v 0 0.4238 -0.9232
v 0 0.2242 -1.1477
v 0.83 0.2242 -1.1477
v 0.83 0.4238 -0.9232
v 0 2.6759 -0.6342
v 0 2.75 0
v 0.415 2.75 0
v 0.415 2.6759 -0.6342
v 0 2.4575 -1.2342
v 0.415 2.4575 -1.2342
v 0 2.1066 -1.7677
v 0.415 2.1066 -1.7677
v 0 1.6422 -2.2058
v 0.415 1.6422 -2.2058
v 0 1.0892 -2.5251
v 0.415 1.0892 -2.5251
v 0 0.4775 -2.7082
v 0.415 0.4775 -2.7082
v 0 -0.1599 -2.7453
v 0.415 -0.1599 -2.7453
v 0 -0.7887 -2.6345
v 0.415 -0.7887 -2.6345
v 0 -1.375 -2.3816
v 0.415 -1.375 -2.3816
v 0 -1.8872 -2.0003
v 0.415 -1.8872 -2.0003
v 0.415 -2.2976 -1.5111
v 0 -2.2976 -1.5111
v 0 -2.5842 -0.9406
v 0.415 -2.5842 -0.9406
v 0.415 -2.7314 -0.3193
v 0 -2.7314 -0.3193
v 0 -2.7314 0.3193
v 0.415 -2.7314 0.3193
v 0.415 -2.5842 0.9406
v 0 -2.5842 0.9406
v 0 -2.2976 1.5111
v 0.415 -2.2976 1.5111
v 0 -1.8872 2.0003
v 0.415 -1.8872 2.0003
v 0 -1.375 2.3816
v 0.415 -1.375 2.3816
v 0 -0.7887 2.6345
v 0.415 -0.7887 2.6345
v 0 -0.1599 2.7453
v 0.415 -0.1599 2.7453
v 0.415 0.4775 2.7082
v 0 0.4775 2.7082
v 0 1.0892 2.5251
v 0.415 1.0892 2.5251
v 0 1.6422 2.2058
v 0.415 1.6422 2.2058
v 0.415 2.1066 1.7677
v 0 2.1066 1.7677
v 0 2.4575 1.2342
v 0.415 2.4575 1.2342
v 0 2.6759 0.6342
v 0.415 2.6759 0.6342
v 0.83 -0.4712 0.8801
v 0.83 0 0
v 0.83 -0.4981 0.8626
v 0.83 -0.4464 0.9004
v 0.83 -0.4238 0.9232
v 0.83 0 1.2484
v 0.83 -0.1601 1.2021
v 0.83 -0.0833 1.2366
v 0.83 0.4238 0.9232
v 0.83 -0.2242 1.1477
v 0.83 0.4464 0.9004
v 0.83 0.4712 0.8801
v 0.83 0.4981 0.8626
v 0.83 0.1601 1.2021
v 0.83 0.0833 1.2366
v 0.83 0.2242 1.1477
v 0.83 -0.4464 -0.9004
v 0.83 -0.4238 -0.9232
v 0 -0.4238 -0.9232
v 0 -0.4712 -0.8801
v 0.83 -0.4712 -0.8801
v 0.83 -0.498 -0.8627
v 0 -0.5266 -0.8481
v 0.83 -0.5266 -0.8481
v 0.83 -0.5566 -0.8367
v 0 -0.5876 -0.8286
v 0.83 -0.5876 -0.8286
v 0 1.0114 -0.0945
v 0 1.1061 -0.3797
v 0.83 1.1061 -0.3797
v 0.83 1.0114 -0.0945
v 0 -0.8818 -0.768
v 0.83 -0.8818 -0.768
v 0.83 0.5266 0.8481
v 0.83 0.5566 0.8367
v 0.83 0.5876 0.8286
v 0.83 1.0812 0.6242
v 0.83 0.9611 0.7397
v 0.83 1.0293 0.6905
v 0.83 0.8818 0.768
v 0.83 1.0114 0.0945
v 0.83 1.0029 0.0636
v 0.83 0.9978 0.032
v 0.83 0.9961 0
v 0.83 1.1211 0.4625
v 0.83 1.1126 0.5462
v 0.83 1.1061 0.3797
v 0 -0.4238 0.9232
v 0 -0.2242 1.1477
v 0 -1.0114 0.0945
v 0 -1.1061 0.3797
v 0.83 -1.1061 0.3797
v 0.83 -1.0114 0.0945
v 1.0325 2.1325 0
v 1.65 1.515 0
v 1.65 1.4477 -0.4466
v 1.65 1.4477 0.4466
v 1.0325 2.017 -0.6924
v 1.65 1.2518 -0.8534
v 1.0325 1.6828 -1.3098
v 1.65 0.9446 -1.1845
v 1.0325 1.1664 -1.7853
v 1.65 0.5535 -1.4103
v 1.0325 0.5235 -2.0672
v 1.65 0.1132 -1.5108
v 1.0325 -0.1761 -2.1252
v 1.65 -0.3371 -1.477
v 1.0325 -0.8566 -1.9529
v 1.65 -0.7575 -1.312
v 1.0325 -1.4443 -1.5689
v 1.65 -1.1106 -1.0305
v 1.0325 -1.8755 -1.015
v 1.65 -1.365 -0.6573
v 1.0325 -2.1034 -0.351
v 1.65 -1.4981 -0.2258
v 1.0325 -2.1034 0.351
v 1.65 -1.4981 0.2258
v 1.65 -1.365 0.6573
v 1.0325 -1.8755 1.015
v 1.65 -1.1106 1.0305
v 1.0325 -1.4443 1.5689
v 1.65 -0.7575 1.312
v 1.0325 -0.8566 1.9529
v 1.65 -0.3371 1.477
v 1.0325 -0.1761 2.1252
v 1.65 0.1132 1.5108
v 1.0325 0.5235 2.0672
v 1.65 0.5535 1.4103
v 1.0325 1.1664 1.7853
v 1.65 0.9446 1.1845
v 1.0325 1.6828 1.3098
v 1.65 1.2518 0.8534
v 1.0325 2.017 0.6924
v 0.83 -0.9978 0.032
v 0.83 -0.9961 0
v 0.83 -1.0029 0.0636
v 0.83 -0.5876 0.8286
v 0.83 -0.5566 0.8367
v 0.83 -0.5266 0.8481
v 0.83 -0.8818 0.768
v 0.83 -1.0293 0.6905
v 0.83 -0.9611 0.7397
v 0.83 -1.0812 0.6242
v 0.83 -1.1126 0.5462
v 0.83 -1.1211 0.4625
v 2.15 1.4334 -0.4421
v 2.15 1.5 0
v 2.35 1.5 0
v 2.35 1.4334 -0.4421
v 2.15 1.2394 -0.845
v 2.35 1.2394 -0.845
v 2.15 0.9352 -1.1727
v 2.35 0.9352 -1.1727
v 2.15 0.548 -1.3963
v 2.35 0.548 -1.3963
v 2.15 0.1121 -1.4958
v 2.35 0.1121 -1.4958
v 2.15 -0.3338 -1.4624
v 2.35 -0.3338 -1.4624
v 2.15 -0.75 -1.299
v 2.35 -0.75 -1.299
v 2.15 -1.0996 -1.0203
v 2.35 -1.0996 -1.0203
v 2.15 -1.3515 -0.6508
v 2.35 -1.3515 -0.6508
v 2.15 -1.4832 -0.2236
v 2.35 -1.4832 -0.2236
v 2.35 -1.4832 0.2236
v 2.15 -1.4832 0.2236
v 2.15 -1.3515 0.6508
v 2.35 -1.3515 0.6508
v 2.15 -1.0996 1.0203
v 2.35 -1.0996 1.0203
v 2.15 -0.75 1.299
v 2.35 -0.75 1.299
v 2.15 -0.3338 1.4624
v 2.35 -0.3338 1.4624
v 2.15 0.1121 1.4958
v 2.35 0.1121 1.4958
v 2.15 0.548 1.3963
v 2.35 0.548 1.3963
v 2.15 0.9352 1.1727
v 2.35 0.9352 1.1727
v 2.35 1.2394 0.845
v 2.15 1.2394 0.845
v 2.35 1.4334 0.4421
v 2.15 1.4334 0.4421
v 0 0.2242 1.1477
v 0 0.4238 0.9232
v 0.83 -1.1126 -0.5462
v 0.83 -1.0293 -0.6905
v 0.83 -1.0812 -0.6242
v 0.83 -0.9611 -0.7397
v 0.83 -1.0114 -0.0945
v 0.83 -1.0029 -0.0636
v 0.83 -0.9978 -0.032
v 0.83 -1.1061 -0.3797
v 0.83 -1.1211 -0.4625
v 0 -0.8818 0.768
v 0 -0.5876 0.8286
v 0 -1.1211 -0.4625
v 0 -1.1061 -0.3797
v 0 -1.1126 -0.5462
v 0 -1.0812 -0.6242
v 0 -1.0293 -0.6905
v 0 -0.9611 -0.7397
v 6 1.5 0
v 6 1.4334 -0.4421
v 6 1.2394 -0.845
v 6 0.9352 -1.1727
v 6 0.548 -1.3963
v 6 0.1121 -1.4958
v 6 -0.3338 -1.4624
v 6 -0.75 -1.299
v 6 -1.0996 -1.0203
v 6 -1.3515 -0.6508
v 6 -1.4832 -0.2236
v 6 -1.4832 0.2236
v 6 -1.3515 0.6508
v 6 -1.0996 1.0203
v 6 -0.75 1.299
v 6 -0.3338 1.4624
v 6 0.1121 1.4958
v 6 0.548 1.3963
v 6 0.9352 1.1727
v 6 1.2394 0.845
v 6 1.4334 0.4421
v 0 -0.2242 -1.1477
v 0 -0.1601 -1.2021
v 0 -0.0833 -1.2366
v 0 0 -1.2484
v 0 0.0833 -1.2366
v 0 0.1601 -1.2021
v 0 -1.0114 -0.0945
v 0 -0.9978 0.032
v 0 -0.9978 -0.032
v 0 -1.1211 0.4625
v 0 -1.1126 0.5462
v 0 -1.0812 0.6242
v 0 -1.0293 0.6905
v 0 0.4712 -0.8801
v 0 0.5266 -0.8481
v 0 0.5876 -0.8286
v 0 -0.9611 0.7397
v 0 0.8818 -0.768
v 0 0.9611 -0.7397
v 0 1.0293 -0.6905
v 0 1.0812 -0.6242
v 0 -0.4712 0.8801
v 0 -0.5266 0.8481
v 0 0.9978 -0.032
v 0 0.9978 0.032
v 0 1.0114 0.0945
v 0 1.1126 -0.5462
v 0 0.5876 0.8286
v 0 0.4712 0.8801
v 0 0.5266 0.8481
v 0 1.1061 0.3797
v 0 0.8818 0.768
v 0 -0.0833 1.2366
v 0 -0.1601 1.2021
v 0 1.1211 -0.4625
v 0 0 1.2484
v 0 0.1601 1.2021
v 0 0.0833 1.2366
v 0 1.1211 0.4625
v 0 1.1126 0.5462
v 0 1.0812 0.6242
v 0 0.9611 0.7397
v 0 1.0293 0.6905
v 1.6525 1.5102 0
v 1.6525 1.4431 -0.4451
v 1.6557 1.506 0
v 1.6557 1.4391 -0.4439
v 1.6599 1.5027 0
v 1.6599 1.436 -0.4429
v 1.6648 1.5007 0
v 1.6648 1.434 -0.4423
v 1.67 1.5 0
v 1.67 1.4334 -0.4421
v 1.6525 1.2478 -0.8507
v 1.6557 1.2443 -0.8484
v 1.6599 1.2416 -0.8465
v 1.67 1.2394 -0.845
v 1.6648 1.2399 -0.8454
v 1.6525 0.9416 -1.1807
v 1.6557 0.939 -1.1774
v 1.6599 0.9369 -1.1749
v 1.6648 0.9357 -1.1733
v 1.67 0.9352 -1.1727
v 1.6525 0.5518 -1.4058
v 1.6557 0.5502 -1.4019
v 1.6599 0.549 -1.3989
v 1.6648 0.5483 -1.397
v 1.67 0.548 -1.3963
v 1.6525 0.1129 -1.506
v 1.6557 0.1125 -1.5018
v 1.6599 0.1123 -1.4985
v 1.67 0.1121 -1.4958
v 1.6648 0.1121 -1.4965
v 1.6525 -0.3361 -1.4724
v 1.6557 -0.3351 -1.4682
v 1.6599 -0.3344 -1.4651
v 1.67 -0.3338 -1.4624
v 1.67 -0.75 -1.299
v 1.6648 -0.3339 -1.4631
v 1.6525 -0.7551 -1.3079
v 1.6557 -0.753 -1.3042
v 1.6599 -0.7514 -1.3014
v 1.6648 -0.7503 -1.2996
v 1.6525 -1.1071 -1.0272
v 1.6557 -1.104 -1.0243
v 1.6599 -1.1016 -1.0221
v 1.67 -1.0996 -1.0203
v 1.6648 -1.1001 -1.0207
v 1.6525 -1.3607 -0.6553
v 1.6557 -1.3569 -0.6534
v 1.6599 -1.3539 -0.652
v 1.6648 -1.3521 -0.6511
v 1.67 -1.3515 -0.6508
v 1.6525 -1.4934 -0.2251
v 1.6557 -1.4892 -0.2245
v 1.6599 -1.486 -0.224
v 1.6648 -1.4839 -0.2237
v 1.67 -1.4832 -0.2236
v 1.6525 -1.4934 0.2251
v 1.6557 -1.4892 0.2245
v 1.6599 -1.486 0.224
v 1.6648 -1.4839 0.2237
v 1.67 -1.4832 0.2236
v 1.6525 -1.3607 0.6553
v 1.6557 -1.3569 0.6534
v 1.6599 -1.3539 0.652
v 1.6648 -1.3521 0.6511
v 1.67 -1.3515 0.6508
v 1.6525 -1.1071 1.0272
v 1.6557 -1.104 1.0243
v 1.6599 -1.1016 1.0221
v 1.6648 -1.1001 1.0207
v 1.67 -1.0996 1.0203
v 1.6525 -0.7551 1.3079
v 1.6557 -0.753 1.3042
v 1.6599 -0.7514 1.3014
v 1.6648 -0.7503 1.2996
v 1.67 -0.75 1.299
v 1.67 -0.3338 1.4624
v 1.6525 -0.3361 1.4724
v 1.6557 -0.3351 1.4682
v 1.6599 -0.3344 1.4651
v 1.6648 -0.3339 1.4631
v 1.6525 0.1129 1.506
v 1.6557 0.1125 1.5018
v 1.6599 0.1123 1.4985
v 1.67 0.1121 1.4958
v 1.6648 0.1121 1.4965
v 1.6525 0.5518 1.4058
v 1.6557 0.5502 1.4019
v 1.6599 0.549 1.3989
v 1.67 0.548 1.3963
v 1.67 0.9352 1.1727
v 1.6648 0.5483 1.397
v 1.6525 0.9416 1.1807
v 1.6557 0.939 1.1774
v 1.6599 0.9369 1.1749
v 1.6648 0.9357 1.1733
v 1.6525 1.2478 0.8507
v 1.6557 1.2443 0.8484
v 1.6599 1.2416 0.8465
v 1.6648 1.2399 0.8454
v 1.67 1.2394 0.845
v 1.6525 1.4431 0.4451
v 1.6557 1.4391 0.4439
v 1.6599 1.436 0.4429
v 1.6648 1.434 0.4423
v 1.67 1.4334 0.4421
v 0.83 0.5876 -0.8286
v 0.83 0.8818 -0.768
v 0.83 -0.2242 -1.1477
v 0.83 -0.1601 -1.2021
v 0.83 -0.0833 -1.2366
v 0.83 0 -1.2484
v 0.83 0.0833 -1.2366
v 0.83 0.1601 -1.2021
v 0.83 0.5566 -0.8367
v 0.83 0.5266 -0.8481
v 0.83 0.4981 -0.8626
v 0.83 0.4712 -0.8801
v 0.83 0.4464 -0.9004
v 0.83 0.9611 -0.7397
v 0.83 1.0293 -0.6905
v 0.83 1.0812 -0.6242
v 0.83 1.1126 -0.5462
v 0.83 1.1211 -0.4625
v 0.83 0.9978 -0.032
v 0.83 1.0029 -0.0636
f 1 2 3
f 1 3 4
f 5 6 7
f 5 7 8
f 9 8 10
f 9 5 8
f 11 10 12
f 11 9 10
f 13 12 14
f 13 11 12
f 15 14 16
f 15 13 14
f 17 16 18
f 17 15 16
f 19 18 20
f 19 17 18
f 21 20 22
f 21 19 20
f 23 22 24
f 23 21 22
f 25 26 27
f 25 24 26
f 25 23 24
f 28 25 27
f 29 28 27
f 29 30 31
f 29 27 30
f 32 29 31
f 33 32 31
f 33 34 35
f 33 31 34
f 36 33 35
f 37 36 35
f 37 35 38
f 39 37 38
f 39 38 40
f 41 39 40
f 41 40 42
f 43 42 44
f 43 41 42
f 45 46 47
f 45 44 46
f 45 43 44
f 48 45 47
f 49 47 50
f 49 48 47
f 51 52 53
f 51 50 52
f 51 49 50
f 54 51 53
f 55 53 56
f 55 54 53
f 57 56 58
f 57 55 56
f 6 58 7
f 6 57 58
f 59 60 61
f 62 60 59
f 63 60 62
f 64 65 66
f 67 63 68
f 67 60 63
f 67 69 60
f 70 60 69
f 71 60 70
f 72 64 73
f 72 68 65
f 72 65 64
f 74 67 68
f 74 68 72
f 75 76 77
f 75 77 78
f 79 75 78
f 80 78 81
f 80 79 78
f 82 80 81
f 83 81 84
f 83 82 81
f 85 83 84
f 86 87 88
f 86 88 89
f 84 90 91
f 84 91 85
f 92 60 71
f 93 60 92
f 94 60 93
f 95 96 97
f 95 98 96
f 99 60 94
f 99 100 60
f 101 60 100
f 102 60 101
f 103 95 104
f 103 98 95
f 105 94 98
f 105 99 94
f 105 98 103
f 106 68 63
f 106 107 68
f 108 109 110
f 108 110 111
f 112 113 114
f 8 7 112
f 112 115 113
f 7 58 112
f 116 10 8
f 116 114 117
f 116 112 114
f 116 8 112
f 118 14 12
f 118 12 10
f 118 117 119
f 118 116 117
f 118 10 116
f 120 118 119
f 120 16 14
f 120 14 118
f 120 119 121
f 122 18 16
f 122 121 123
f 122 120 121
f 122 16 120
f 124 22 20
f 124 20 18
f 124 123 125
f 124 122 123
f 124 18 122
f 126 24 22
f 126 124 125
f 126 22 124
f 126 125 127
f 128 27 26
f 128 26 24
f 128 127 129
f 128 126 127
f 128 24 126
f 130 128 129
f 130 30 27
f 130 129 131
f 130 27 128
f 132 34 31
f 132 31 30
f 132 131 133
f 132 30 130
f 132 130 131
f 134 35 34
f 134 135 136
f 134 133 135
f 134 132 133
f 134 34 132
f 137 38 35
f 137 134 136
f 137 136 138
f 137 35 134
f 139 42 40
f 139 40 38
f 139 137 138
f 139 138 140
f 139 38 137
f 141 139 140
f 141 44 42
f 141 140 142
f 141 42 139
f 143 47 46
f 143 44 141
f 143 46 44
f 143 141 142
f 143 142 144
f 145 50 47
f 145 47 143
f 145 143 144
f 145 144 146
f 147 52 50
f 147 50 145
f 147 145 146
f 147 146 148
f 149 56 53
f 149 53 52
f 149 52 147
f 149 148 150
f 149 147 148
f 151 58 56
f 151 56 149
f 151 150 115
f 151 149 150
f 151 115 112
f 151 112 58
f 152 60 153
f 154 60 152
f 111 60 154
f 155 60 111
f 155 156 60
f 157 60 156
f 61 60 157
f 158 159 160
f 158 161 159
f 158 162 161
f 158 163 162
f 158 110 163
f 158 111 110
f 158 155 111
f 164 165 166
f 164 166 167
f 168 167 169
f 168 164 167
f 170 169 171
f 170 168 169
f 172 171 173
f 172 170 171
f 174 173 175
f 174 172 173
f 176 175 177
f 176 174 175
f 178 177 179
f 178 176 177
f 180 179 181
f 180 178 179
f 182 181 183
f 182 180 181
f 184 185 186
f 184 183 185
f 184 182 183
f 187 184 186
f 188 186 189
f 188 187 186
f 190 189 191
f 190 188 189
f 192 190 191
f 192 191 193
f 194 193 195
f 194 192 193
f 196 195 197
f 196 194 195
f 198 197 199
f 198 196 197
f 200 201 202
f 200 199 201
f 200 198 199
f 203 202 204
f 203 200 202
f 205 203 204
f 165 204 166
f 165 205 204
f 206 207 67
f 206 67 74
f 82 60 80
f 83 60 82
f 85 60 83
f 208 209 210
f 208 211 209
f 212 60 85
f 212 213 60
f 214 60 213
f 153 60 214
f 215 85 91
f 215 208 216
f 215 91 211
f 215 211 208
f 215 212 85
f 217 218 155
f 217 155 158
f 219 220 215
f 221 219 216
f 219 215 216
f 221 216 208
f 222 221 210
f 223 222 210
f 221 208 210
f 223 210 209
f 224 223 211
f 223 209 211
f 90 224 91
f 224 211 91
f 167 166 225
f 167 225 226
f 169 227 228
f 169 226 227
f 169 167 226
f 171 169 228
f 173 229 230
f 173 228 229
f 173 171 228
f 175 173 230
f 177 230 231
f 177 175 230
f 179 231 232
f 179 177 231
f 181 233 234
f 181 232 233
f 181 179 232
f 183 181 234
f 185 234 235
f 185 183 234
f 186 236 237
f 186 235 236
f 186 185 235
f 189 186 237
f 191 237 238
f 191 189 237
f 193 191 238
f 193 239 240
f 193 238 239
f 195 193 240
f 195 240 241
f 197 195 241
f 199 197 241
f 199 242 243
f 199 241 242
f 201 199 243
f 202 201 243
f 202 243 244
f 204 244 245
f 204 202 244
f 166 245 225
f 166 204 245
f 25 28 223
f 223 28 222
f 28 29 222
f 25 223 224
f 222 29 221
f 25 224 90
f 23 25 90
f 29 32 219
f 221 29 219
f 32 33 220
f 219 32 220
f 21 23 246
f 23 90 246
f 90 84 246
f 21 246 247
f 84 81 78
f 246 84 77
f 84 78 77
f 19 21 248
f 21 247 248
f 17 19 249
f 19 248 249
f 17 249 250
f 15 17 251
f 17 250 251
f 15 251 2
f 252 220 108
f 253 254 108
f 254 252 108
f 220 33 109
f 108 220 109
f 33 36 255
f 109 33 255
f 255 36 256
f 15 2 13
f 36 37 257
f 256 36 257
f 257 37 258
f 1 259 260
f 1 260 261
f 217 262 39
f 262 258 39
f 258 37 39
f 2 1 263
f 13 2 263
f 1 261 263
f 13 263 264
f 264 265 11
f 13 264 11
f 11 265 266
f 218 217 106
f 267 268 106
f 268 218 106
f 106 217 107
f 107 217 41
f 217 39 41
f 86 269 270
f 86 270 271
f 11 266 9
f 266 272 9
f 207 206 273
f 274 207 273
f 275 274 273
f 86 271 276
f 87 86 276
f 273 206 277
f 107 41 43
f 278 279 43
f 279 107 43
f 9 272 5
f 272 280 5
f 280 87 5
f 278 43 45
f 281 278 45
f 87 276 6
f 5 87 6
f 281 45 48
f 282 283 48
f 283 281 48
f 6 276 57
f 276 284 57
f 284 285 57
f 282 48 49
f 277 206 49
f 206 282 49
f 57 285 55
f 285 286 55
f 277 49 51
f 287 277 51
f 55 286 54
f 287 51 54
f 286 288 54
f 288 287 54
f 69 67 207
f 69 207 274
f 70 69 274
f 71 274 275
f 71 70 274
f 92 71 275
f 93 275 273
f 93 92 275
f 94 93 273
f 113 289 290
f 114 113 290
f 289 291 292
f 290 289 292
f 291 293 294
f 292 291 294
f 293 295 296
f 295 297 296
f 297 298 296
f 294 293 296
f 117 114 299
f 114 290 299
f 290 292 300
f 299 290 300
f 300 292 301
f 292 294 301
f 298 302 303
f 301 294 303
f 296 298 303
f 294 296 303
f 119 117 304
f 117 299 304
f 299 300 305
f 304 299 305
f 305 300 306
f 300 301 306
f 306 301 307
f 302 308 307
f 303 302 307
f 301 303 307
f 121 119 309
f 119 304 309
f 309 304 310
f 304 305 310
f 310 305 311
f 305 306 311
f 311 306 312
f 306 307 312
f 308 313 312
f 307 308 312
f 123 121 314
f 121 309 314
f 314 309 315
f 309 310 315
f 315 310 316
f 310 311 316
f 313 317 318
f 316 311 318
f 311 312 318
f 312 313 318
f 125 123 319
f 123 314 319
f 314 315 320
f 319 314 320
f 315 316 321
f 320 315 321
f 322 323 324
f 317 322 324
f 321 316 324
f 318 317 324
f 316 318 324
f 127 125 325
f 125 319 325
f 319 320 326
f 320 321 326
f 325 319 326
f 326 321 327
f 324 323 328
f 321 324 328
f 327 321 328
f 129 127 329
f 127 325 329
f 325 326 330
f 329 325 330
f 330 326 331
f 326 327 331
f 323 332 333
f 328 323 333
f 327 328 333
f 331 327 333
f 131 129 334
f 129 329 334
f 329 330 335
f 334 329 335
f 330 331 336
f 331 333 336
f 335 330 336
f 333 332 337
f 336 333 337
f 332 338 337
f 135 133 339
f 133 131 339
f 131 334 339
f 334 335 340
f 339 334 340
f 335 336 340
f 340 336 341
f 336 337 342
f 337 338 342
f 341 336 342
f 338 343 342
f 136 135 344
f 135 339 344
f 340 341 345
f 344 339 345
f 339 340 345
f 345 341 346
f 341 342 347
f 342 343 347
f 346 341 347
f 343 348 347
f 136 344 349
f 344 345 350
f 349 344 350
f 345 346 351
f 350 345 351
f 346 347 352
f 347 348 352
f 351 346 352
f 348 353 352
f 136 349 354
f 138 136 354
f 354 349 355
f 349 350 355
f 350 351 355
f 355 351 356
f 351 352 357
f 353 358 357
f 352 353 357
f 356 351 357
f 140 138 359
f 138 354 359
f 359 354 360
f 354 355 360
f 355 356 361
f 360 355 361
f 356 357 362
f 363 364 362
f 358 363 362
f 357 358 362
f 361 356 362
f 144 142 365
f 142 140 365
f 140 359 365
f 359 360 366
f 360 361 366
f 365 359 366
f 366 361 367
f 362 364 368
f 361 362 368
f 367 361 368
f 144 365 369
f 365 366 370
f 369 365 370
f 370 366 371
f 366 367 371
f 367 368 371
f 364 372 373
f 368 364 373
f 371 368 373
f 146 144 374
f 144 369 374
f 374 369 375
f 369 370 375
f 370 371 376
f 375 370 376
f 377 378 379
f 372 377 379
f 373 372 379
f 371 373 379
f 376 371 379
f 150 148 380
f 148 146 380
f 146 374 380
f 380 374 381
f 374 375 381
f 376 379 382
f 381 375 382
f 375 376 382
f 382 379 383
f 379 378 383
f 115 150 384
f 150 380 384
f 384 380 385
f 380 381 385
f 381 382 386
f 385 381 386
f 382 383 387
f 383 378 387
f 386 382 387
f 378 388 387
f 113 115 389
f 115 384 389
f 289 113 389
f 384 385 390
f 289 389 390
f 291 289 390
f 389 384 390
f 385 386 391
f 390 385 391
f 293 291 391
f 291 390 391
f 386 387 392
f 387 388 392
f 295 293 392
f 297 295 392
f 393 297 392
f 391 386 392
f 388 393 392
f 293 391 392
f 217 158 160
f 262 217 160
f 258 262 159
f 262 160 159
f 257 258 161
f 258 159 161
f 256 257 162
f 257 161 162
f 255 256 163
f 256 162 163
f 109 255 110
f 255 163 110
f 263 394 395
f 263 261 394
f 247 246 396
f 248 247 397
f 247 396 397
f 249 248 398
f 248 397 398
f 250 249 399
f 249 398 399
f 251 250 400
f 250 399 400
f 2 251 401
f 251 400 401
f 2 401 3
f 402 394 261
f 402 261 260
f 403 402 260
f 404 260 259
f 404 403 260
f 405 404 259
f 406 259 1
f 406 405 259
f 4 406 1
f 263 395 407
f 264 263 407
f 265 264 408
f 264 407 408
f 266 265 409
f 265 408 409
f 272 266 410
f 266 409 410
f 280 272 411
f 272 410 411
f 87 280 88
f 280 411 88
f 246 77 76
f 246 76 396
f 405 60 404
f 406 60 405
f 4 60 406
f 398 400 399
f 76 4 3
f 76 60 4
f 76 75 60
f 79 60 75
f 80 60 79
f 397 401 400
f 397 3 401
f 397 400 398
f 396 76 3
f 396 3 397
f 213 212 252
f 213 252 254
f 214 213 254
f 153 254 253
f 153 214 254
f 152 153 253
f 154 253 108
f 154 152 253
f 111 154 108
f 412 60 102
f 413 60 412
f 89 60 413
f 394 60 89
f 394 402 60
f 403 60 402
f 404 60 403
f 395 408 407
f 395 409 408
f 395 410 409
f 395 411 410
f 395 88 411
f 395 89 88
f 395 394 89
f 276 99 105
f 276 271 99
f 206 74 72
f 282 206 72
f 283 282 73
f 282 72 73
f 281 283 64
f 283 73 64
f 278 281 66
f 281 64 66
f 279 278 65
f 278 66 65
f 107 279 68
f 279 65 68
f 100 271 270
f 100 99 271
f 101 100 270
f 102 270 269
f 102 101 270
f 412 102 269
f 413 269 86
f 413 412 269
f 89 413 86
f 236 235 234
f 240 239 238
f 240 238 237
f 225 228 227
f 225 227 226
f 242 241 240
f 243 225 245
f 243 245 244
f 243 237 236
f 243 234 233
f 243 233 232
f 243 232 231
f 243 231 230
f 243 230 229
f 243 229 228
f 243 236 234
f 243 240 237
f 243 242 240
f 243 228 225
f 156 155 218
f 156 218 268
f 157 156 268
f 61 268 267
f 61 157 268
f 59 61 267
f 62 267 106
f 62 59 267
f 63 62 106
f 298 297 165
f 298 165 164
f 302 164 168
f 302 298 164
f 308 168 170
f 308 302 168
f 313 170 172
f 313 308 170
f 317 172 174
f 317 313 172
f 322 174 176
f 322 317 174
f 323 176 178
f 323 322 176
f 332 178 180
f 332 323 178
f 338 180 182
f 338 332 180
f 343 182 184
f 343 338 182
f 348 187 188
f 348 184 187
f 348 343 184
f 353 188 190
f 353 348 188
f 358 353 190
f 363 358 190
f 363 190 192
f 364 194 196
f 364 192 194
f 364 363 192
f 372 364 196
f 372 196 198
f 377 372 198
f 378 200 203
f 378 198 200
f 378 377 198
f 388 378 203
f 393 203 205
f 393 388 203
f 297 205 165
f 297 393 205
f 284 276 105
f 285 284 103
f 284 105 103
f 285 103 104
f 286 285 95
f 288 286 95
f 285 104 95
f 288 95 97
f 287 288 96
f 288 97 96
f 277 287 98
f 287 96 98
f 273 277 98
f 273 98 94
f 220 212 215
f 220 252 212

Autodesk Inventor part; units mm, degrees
ref_plane "YZ Plane" through (0, 0, 0) normal (1, 0, 0) x (0, 1, 0)
ref_plane "XZ Plane" through (0, 0, 0) normal (0, 1, 0) x (-1, 0, 0)
ref_plane "XY Plane" through (0, 0, 0) normal (0, 0, 1) x (1, 0, 0)
sketch "Sketch1" plane through (0, 0, 0) normal (0, 0, 1) x (1, 0, 0)
  line L0 (0, 0) -> (6, 0)
  line L1 (6, 0) -> (6, 1.5)
  line L2 (6, 1.5) -> (2.35, 1.5)
  line L3 (2.35, 1.5) -> (2.15, 1.5)
  line L4 (2.15, 1.5) -> (1.67, 1.5)
  line L5 (1.65, 1.515) -> (1.65, 1.515)
  line L6 (1.65, 1.515) -> (0.415, 2.75)
  line L7 (0.415, 2.75) -> (0, 2.75)
  line L8 (0, 2.75) -> (0, 0)
  line L9 (1.65, 1.515) -> (1.65, 1.52)
  arc A0 (1.65, 1.52) -> (1.67, 1.5) centre (1.67, 1.52) ccw
  dimension "d17" = 6
  dimension "d18" = 0.415
  dimension "d19" = 1.65
  dimension "d20" = 0
  dimension "d21" = 5.5
  dimension "d22" = 3
  dimension "d23" = 3
  dimension "d25" = 45
  dimension "d26" = 0.2
  dimension "d28" = 0.02
  dimension "d29" = 3.65
  dimension "d30" = 0.02
  dimension "d52" = 0.7
revolve "Revolution1" add sketch "Sketch1" angle 360 about axis through (0, 0, 0) along (1, 0, 0)
thread "Thread1" size "M3x0.5" class "6g" standard "ISO Metric profile" length 3.65
sketch "Sketch2" plane through (0, 0, 0) normal (-1, 0, 0) x (0, 0, 1)
  circle A0 centre (0, 0) radius 1.4 construction
  circle A1 centre (0, 0) radius 0.98 construction
  line L0 (0, 0) -> (0.8487, 0.49)
  line L1 (0, 0) -> (0.98, 0) construction
  line L2 (0, 0) -> (0.8487, -0.49)
  line L3 (0, 0) -> (0.98, 0) construction
  line L4 (0.8487, 0.49) -> (1.4, 0)
  line L5 (1.4, 0) -> (0.8487, -0.49)
  dimension "d34" = 2.8
  dimension "d35" = 1.96
  dimension "d39" = 30
  dimension "d40" = 330
extrude "Extrusion1" cut sketch "Sketch2" against normal blind 0.83
pattern_circular "Circular Pattern1" count 6 over 360 about axis through (-10, 0, 0) along (1, 0, 0) of "Extrusion1"
fillet "Fillet1" radius 0.3 12 edges at (0.415, 0.49, 0.8487) (0.415, 0, 1.4) (0.415, -0.49, 0.8487) (0.415, -0.98, 0) (0.415, -1.2124, 0.7) (0.415, -1.2124, -0.7) (0.415, -0.49, -0.8487) (0.415, 0, -1.4) (0.415, 0.49, -0.8487) (0.415, 1.2124, -0.7) (0.415, 0.98, 0) (0.415, 1.2124, 0.7)
equation "\"d17\" = l_"
equation "\"d18\" = 0.5 * t"
equation "\"d19\" = k"
equation "\"d21\" = dk"
equation "\"d22\" = d"
equation "\"d23\" = ds_"
equation "\"d25\" = 0.5 * headAngle"
equation "\"d26\" = x"
equation "\"d28\" = r"
equation "\"d29\" = b"
equation "\"d32\" = b"
equation "\"d34\" = A_"
equation "\"d35\" = 0.7 * A_"
equation "\"d43\" = t"
equation "\"d48\" = v"
equation "\"A_\" = 2.8"
equation "\"t\" = 0.83"
equation "\"v\" = 0.1 * d"
equation "\"dk\" = 5.5"
equation "\"k\" = 1.65"
equation "\"l_\" = 6"
equation "\"shldr\" = 0"
equation "\"d\" = 3"
equation "\"p\" = 0.8"
equation "\"x\" = 0.2"
equation "\"ds_\" = 3"
equation "\"headAngle\" = 90deg"
equation "\"c_\" = 0.35 * v"
equation "\"r\" = 0.02"
equation "\"b\" = 3.65"
properties part number "Hexalobular socket countersunk flat head screw ISO 14581 - M3x6-4.8" material "Steel"
